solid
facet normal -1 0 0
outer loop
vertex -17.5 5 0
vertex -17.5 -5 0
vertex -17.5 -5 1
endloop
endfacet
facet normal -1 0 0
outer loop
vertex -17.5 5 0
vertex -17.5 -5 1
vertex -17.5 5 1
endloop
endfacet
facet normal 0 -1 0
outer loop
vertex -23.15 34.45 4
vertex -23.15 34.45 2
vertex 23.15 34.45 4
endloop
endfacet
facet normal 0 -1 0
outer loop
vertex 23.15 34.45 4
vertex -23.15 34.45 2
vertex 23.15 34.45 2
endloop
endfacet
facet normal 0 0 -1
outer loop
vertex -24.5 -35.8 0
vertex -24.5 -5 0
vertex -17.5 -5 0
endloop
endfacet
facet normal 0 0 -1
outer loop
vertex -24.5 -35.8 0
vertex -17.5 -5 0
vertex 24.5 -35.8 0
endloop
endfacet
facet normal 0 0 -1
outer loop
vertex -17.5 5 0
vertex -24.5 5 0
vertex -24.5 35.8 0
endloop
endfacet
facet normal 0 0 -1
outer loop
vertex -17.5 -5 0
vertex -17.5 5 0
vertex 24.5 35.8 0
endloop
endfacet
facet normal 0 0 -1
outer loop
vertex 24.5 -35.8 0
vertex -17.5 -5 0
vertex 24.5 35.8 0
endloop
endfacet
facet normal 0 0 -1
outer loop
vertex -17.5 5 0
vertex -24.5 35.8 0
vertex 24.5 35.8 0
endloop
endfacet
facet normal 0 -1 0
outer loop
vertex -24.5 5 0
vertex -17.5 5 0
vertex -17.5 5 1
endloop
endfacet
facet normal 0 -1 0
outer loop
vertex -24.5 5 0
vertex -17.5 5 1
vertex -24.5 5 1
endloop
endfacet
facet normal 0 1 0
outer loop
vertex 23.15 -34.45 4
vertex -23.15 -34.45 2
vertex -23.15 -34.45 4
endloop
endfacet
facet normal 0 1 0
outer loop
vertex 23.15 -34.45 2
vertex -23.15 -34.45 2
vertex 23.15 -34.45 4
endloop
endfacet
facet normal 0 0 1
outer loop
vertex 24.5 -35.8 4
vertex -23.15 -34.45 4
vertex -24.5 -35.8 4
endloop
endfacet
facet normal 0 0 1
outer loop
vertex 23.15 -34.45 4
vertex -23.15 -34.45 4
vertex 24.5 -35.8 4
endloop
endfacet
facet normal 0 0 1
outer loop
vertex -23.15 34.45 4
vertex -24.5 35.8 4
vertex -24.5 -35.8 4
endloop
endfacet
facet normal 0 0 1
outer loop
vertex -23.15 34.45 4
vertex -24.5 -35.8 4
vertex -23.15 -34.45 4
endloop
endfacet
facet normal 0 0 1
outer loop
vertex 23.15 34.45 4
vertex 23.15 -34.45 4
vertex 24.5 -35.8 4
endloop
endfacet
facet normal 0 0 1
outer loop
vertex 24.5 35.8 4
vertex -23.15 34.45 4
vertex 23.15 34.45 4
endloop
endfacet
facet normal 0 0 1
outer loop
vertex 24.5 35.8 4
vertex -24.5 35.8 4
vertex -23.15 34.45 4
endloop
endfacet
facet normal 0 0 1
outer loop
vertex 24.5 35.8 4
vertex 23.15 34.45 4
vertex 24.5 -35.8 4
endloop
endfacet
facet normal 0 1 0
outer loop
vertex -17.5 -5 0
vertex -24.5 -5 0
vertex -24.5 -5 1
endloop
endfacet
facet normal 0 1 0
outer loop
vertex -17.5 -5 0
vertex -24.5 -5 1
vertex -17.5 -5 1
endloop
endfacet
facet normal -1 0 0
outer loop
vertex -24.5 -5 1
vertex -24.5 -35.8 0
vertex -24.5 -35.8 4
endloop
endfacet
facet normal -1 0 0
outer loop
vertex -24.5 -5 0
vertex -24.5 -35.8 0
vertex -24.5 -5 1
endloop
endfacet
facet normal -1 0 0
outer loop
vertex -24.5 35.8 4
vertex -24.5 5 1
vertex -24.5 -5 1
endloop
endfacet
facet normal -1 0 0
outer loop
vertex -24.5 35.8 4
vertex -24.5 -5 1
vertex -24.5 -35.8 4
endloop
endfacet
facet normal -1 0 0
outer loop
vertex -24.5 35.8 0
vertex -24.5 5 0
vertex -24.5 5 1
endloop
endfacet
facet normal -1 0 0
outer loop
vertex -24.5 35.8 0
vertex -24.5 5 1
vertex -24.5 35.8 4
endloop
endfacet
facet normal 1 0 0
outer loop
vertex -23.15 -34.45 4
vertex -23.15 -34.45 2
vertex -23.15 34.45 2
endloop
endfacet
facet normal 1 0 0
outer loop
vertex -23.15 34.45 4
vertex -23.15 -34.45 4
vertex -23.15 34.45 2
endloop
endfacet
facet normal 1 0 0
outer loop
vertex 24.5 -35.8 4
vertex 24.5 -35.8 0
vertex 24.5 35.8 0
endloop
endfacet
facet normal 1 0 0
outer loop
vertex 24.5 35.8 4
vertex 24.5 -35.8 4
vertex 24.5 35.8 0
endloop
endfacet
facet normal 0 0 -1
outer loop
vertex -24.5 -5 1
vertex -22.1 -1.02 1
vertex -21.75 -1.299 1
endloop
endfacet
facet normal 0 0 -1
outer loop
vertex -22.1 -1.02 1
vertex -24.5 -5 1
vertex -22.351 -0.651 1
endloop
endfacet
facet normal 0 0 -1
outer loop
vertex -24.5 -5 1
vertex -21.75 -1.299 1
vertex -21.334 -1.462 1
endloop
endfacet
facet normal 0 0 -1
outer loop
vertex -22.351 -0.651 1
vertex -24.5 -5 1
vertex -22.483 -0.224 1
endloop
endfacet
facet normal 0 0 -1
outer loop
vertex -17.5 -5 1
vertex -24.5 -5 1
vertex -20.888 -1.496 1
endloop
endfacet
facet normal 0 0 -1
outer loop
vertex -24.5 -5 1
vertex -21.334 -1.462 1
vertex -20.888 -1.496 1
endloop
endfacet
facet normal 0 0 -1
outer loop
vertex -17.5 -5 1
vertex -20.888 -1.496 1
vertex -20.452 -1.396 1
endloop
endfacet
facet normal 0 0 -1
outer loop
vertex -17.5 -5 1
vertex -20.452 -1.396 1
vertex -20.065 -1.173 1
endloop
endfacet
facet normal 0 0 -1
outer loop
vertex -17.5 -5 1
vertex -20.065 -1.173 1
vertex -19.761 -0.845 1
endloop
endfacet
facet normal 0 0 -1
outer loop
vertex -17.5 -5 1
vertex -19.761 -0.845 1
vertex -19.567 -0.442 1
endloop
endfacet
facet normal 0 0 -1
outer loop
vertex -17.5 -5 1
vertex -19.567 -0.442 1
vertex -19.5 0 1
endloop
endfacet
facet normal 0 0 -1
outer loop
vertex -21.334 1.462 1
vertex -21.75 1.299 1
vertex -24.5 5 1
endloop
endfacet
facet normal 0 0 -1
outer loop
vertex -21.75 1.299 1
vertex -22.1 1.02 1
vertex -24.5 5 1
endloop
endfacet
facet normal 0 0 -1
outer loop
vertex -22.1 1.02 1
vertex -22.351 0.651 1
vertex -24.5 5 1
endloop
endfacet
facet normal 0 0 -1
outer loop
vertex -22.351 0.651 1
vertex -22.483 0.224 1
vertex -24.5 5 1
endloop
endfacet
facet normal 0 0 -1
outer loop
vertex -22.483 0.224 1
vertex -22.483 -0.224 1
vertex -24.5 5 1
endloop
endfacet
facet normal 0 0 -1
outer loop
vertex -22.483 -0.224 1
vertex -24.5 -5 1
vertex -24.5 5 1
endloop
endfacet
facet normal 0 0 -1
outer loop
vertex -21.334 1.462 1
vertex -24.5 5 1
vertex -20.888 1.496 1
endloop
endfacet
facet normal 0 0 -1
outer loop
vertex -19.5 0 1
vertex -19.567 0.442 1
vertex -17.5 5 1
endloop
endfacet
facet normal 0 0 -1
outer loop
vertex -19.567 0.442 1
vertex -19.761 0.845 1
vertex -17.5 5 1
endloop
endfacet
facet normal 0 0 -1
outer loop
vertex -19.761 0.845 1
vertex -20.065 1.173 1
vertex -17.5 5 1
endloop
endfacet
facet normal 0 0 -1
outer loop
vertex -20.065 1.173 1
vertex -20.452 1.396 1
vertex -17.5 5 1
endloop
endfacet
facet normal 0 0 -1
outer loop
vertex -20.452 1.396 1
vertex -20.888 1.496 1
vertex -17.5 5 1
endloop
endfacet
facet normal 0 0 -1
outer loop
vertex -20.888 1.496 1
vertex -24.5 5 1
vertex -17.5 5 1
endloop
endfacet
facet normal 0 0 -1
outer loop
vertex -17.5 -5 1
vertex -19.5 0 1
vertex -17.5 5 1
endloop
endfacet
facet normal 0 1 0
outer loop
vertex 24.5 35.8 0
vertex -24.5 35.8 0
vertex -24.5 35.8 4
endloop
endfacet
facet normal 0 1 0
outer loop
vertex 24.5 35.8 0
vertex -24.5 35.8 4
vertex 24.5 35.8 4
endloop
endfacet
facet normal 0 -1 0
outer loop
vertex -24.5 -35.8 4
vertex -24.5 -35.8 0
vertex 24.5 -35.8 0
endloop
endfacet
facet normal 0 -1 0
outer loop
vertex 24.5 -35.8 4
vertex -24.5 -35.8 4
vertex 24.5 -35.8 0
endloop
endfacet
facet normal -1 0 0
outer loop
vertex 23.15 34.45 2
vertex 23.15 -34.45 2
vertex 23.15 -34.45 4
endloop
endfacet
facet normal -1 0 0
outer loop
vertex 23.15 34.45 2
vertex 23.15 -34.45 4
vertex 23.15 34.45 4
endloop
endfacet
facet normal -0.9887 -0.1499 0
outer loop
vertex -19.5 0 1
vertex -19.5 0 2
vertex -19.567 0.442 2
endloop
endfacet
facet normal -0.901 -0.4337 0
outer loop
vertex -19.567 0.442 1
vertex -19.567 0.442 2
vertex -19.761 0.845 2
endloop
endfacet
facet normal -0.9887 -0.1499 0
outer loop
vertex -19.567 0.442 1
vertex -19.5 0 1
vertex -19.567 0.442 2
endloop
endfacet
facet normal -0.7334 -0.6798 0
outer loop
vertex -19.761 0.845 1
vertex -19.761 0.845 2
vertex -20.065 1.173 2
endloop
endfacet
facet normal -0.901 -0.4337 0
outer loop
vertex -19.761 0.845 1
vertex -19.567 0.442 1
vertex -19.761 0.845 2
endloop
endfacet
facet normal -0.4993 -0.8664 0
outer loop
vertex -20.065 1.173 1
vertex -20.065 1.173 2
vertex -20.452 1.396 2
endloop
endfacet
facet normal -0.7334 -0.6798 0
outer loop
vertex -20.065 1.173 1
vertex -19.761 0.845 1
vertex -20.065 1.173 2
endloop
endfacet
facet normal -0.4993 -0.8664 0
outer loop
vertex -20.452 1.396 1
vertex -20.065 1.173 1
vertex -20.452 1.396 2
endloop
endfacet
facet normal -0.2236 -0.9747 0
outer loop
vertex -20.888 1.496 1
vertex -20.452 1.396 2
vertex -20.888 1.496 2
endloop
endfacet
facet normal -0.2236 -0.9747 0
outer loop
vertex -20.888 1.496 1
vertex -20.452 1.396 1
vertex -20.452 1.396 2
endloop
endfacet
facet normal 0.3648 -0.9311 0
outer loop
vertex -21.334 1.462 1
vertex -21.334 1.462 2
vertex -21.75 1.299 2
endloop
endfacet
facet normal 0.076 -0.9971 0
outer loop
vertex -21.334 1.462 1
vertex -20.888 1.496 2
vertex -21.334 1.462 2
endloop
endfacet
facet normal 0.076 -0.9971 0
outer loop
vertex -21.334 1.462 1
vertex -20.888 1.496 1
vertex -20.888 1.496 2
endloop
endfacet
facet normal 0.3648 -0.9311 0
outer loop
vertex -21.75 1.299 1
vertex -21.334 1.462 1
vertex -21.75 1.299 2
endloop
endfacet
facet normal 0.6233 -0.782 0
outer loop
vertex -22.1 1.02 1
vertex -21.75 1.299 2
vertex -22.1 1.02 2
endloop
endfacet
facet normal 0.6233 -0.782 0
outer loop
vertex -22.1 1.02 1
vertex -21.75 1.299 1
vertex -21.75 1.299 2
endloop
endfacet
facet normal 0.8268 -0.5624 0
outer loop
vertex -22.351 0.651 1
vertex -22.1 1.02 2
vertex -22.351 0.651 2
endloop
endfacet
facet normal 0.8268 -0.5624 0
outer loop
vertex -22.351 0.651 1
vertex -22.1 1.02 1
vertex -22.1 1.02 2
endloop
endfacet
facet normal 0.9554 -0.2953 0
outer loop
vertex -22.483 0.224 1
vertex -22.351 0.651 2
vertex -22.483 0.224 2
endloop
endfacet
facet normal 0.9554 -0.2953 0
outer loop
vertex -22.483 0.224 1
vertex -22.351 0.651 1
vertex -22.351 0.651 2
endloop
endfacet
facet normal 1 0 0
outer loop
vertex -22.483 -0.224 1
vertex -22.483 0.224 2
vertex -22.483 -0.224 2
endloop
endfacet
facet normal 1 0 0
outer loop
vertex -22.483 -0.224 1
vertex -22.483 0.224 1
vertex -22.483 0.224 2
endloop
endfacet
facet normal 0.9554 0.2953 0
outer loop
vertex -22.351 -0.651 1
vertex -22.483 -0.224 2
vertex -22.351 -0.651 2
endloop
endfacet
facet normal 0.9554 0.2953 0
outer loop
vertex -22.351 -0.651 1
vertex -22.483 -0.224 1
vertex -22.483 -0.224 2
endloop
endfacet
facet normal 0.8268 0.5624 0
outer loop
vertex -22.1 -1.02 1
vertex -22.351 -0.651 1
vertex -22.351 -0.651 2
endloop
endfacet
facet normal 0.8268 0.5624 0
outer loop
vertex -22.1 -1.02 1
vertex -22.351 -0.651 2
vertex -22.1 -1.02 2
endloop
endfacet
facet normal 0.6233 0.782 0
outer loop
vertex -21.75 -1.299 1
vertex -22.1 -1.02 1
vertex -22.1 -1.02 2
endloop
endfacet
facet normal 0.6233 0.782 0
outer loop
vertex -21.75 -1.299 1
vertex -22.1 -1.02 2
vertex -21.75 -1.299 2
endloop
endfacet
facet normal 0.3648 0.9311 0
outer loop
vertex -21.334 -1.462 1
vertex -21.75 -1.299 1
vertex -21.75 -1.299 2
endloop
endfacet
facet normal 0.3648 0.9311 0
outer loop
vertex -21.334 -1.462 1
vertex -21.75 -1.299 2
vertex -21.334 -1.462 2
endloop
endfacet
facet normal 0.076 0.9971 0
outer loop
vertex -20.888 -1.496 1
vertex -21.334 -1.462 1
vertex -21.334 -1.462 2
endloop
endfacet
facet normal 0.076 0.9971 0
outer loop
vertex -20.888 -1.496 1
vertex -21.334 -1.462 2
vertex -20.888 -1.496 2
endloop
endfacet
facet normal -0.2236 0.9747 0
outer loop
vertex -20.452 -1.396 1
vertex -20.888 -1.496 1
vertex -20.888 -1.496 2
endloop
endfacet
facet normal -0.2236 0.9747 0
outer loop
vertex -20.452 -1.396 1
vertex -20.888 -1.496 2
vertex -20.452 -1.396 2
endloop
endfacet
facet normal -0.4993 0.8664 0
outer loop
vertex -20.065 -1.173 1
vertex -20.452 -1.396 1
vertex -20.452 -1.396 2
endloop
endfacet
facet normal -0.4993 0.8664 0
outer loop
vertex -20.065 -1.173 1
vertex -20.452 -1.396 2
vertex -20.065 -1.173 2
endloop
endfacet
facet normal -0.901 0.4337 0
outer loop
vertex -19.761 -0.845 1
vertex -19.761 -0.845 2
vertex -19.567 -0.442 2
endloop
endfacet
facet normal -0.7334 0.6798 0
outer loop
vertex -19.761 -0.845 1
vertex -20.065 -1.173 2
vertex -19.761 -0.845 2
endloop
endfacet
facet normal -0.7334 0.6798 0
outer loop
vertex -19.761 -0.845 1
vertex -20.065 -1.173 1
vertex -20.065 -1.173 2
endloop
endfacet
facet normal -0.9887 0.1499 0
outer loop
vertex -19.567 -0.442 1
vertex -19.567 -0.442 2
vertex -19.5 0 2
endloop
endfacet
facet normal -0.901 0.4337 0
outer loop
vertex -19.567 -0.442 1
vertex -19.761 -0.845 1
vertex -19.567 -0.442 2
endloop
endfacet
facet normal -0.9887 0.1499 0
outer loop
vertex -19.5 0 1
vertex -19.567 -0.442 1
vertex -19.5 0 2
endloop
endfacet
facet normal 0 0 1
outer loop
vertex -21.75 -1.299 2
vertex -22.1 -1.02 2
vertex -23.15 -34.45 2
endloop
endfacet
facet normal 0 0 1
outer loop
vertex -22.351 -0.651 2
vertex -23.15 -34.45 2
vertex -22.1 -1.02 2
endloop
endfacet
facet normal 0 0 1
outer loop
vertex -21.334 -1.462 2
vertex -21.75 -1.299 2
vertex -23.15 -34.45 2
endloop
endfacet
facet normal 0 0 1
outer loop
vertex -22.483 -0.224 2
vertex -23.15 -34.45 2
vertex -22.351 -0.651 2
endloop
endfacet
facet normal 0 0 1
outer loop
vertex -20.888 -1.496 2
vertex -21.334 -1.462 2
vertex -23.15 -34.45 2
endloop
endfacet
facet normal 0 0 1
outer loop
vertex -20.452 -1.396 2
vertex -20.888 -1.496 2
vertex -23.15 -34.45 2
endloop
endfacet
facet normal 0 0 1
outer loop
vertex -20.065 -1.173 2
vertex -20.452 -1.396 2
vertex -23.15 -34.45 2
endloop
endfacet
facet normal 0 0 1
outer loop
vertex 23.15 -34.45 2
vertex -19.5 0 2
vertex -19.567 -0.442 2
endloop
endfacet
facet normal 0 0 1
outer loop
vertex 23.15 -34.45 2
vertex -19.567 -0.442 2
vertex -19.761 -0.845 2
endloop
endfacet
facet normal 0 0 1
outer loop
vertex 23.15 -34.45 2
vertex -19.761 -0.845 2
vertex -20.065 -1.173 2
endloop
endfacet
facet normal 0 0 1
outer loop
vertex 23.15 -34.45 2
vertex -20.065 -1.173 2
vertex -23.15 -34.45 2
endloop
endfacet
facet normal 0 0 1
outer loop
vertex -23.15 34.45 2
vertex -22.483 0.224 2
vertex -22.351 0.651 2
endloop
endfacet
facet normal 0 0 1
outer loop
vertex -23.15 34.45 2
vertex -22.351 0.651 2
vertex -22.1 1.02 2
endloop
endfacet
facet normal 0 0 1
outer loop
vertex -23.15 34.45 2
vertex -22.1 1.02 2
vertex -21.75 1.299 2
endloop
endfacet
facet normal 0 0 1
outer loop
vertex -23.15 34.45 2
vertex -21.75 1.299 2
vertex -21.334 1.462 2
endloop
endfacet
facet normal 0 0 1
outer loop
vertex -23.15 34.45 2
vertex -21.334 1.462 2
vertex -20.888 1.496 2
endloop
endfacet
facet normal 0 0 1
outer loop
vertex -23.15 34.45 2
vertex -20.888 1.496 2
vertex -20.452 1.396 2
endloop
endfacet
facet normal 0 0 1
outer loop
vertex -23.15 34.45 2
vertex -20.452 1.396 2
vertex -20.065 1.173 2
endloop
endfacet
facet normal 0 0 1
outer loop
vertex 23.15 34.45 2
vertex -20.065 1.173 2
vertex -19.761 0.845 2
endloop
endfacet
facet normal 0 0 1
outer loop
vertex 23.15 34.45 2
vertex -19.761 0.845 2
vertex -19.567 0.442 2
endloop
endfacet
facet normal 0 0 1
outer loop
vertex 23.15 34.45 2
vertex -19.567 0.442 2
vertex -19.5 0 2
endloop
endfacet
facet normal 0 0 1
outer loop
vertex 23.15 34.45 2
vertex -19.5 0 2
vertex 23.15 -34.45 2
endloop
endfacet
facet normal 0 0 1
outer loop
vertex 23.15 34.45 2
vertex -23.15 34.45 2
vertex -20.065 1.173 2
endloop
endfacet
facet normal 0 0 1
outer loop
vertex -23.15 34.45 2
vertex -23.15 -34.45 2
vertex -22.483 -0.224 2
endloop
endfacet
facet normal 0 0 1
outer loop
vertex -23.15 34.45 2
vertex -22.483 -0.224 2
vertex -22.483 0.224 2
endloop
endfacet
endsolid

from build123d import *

# Parameters (mm, degrees)
F0_W     = 49
F0_H     = 71.6
F0_W_2   = 46.3
F0_H_2   = 68.9
F1_DEPTH = 4
F2_DEPTH = 2
F3_W     = 5.65
F3_H     = 10
F3_R     = 1.5
F3_W_2   = 1.35
F4_DEPTH = 1
F5_DEPTH = 4.9


with BuildPart() as f1:
    # F0 (on Top) → F1 (new body)
    with BuildSketch(Plane.XY):
        Rectangle(F0_W, F0_H)
        Rectangle(F0_W_2, F0_H_2, mode=Mode.SUBTRACT)
    extrude(amount=F1_DEPTH)

    # F0 (on Top) → F2 (join)
    with BuildSketch(Plane.XY):
        Rectangle(F0_W_2, F0_H_2)
    extrude(amount=F2_DEPTH)

    # F3 (on face) → F4 (cut)
    with BuildSketch(Plane.XY):
        with Locations((-20.325, 0)):
            Rectangle(F3_W, F3_H)
        with Locations((-21, 0)):
            Circle(F3_R, mode=Mode.SUBTRACT)
        with Locations((-23.825, 0)):
            Rectangle(F3_W_2, F3_H)
    extrude(amount=F4_DEPTH, mode=Mode.SUBTRACT)

    # F3 (on face) → F5 (cut)
    with BuildSketch(Plane.XY):
        with Locations((-21, 0)):
            Circle(F3_R)
    extrude(amount=F5_DEPTH, mode=Mode.SUBTRACT)


solid = f1.part
